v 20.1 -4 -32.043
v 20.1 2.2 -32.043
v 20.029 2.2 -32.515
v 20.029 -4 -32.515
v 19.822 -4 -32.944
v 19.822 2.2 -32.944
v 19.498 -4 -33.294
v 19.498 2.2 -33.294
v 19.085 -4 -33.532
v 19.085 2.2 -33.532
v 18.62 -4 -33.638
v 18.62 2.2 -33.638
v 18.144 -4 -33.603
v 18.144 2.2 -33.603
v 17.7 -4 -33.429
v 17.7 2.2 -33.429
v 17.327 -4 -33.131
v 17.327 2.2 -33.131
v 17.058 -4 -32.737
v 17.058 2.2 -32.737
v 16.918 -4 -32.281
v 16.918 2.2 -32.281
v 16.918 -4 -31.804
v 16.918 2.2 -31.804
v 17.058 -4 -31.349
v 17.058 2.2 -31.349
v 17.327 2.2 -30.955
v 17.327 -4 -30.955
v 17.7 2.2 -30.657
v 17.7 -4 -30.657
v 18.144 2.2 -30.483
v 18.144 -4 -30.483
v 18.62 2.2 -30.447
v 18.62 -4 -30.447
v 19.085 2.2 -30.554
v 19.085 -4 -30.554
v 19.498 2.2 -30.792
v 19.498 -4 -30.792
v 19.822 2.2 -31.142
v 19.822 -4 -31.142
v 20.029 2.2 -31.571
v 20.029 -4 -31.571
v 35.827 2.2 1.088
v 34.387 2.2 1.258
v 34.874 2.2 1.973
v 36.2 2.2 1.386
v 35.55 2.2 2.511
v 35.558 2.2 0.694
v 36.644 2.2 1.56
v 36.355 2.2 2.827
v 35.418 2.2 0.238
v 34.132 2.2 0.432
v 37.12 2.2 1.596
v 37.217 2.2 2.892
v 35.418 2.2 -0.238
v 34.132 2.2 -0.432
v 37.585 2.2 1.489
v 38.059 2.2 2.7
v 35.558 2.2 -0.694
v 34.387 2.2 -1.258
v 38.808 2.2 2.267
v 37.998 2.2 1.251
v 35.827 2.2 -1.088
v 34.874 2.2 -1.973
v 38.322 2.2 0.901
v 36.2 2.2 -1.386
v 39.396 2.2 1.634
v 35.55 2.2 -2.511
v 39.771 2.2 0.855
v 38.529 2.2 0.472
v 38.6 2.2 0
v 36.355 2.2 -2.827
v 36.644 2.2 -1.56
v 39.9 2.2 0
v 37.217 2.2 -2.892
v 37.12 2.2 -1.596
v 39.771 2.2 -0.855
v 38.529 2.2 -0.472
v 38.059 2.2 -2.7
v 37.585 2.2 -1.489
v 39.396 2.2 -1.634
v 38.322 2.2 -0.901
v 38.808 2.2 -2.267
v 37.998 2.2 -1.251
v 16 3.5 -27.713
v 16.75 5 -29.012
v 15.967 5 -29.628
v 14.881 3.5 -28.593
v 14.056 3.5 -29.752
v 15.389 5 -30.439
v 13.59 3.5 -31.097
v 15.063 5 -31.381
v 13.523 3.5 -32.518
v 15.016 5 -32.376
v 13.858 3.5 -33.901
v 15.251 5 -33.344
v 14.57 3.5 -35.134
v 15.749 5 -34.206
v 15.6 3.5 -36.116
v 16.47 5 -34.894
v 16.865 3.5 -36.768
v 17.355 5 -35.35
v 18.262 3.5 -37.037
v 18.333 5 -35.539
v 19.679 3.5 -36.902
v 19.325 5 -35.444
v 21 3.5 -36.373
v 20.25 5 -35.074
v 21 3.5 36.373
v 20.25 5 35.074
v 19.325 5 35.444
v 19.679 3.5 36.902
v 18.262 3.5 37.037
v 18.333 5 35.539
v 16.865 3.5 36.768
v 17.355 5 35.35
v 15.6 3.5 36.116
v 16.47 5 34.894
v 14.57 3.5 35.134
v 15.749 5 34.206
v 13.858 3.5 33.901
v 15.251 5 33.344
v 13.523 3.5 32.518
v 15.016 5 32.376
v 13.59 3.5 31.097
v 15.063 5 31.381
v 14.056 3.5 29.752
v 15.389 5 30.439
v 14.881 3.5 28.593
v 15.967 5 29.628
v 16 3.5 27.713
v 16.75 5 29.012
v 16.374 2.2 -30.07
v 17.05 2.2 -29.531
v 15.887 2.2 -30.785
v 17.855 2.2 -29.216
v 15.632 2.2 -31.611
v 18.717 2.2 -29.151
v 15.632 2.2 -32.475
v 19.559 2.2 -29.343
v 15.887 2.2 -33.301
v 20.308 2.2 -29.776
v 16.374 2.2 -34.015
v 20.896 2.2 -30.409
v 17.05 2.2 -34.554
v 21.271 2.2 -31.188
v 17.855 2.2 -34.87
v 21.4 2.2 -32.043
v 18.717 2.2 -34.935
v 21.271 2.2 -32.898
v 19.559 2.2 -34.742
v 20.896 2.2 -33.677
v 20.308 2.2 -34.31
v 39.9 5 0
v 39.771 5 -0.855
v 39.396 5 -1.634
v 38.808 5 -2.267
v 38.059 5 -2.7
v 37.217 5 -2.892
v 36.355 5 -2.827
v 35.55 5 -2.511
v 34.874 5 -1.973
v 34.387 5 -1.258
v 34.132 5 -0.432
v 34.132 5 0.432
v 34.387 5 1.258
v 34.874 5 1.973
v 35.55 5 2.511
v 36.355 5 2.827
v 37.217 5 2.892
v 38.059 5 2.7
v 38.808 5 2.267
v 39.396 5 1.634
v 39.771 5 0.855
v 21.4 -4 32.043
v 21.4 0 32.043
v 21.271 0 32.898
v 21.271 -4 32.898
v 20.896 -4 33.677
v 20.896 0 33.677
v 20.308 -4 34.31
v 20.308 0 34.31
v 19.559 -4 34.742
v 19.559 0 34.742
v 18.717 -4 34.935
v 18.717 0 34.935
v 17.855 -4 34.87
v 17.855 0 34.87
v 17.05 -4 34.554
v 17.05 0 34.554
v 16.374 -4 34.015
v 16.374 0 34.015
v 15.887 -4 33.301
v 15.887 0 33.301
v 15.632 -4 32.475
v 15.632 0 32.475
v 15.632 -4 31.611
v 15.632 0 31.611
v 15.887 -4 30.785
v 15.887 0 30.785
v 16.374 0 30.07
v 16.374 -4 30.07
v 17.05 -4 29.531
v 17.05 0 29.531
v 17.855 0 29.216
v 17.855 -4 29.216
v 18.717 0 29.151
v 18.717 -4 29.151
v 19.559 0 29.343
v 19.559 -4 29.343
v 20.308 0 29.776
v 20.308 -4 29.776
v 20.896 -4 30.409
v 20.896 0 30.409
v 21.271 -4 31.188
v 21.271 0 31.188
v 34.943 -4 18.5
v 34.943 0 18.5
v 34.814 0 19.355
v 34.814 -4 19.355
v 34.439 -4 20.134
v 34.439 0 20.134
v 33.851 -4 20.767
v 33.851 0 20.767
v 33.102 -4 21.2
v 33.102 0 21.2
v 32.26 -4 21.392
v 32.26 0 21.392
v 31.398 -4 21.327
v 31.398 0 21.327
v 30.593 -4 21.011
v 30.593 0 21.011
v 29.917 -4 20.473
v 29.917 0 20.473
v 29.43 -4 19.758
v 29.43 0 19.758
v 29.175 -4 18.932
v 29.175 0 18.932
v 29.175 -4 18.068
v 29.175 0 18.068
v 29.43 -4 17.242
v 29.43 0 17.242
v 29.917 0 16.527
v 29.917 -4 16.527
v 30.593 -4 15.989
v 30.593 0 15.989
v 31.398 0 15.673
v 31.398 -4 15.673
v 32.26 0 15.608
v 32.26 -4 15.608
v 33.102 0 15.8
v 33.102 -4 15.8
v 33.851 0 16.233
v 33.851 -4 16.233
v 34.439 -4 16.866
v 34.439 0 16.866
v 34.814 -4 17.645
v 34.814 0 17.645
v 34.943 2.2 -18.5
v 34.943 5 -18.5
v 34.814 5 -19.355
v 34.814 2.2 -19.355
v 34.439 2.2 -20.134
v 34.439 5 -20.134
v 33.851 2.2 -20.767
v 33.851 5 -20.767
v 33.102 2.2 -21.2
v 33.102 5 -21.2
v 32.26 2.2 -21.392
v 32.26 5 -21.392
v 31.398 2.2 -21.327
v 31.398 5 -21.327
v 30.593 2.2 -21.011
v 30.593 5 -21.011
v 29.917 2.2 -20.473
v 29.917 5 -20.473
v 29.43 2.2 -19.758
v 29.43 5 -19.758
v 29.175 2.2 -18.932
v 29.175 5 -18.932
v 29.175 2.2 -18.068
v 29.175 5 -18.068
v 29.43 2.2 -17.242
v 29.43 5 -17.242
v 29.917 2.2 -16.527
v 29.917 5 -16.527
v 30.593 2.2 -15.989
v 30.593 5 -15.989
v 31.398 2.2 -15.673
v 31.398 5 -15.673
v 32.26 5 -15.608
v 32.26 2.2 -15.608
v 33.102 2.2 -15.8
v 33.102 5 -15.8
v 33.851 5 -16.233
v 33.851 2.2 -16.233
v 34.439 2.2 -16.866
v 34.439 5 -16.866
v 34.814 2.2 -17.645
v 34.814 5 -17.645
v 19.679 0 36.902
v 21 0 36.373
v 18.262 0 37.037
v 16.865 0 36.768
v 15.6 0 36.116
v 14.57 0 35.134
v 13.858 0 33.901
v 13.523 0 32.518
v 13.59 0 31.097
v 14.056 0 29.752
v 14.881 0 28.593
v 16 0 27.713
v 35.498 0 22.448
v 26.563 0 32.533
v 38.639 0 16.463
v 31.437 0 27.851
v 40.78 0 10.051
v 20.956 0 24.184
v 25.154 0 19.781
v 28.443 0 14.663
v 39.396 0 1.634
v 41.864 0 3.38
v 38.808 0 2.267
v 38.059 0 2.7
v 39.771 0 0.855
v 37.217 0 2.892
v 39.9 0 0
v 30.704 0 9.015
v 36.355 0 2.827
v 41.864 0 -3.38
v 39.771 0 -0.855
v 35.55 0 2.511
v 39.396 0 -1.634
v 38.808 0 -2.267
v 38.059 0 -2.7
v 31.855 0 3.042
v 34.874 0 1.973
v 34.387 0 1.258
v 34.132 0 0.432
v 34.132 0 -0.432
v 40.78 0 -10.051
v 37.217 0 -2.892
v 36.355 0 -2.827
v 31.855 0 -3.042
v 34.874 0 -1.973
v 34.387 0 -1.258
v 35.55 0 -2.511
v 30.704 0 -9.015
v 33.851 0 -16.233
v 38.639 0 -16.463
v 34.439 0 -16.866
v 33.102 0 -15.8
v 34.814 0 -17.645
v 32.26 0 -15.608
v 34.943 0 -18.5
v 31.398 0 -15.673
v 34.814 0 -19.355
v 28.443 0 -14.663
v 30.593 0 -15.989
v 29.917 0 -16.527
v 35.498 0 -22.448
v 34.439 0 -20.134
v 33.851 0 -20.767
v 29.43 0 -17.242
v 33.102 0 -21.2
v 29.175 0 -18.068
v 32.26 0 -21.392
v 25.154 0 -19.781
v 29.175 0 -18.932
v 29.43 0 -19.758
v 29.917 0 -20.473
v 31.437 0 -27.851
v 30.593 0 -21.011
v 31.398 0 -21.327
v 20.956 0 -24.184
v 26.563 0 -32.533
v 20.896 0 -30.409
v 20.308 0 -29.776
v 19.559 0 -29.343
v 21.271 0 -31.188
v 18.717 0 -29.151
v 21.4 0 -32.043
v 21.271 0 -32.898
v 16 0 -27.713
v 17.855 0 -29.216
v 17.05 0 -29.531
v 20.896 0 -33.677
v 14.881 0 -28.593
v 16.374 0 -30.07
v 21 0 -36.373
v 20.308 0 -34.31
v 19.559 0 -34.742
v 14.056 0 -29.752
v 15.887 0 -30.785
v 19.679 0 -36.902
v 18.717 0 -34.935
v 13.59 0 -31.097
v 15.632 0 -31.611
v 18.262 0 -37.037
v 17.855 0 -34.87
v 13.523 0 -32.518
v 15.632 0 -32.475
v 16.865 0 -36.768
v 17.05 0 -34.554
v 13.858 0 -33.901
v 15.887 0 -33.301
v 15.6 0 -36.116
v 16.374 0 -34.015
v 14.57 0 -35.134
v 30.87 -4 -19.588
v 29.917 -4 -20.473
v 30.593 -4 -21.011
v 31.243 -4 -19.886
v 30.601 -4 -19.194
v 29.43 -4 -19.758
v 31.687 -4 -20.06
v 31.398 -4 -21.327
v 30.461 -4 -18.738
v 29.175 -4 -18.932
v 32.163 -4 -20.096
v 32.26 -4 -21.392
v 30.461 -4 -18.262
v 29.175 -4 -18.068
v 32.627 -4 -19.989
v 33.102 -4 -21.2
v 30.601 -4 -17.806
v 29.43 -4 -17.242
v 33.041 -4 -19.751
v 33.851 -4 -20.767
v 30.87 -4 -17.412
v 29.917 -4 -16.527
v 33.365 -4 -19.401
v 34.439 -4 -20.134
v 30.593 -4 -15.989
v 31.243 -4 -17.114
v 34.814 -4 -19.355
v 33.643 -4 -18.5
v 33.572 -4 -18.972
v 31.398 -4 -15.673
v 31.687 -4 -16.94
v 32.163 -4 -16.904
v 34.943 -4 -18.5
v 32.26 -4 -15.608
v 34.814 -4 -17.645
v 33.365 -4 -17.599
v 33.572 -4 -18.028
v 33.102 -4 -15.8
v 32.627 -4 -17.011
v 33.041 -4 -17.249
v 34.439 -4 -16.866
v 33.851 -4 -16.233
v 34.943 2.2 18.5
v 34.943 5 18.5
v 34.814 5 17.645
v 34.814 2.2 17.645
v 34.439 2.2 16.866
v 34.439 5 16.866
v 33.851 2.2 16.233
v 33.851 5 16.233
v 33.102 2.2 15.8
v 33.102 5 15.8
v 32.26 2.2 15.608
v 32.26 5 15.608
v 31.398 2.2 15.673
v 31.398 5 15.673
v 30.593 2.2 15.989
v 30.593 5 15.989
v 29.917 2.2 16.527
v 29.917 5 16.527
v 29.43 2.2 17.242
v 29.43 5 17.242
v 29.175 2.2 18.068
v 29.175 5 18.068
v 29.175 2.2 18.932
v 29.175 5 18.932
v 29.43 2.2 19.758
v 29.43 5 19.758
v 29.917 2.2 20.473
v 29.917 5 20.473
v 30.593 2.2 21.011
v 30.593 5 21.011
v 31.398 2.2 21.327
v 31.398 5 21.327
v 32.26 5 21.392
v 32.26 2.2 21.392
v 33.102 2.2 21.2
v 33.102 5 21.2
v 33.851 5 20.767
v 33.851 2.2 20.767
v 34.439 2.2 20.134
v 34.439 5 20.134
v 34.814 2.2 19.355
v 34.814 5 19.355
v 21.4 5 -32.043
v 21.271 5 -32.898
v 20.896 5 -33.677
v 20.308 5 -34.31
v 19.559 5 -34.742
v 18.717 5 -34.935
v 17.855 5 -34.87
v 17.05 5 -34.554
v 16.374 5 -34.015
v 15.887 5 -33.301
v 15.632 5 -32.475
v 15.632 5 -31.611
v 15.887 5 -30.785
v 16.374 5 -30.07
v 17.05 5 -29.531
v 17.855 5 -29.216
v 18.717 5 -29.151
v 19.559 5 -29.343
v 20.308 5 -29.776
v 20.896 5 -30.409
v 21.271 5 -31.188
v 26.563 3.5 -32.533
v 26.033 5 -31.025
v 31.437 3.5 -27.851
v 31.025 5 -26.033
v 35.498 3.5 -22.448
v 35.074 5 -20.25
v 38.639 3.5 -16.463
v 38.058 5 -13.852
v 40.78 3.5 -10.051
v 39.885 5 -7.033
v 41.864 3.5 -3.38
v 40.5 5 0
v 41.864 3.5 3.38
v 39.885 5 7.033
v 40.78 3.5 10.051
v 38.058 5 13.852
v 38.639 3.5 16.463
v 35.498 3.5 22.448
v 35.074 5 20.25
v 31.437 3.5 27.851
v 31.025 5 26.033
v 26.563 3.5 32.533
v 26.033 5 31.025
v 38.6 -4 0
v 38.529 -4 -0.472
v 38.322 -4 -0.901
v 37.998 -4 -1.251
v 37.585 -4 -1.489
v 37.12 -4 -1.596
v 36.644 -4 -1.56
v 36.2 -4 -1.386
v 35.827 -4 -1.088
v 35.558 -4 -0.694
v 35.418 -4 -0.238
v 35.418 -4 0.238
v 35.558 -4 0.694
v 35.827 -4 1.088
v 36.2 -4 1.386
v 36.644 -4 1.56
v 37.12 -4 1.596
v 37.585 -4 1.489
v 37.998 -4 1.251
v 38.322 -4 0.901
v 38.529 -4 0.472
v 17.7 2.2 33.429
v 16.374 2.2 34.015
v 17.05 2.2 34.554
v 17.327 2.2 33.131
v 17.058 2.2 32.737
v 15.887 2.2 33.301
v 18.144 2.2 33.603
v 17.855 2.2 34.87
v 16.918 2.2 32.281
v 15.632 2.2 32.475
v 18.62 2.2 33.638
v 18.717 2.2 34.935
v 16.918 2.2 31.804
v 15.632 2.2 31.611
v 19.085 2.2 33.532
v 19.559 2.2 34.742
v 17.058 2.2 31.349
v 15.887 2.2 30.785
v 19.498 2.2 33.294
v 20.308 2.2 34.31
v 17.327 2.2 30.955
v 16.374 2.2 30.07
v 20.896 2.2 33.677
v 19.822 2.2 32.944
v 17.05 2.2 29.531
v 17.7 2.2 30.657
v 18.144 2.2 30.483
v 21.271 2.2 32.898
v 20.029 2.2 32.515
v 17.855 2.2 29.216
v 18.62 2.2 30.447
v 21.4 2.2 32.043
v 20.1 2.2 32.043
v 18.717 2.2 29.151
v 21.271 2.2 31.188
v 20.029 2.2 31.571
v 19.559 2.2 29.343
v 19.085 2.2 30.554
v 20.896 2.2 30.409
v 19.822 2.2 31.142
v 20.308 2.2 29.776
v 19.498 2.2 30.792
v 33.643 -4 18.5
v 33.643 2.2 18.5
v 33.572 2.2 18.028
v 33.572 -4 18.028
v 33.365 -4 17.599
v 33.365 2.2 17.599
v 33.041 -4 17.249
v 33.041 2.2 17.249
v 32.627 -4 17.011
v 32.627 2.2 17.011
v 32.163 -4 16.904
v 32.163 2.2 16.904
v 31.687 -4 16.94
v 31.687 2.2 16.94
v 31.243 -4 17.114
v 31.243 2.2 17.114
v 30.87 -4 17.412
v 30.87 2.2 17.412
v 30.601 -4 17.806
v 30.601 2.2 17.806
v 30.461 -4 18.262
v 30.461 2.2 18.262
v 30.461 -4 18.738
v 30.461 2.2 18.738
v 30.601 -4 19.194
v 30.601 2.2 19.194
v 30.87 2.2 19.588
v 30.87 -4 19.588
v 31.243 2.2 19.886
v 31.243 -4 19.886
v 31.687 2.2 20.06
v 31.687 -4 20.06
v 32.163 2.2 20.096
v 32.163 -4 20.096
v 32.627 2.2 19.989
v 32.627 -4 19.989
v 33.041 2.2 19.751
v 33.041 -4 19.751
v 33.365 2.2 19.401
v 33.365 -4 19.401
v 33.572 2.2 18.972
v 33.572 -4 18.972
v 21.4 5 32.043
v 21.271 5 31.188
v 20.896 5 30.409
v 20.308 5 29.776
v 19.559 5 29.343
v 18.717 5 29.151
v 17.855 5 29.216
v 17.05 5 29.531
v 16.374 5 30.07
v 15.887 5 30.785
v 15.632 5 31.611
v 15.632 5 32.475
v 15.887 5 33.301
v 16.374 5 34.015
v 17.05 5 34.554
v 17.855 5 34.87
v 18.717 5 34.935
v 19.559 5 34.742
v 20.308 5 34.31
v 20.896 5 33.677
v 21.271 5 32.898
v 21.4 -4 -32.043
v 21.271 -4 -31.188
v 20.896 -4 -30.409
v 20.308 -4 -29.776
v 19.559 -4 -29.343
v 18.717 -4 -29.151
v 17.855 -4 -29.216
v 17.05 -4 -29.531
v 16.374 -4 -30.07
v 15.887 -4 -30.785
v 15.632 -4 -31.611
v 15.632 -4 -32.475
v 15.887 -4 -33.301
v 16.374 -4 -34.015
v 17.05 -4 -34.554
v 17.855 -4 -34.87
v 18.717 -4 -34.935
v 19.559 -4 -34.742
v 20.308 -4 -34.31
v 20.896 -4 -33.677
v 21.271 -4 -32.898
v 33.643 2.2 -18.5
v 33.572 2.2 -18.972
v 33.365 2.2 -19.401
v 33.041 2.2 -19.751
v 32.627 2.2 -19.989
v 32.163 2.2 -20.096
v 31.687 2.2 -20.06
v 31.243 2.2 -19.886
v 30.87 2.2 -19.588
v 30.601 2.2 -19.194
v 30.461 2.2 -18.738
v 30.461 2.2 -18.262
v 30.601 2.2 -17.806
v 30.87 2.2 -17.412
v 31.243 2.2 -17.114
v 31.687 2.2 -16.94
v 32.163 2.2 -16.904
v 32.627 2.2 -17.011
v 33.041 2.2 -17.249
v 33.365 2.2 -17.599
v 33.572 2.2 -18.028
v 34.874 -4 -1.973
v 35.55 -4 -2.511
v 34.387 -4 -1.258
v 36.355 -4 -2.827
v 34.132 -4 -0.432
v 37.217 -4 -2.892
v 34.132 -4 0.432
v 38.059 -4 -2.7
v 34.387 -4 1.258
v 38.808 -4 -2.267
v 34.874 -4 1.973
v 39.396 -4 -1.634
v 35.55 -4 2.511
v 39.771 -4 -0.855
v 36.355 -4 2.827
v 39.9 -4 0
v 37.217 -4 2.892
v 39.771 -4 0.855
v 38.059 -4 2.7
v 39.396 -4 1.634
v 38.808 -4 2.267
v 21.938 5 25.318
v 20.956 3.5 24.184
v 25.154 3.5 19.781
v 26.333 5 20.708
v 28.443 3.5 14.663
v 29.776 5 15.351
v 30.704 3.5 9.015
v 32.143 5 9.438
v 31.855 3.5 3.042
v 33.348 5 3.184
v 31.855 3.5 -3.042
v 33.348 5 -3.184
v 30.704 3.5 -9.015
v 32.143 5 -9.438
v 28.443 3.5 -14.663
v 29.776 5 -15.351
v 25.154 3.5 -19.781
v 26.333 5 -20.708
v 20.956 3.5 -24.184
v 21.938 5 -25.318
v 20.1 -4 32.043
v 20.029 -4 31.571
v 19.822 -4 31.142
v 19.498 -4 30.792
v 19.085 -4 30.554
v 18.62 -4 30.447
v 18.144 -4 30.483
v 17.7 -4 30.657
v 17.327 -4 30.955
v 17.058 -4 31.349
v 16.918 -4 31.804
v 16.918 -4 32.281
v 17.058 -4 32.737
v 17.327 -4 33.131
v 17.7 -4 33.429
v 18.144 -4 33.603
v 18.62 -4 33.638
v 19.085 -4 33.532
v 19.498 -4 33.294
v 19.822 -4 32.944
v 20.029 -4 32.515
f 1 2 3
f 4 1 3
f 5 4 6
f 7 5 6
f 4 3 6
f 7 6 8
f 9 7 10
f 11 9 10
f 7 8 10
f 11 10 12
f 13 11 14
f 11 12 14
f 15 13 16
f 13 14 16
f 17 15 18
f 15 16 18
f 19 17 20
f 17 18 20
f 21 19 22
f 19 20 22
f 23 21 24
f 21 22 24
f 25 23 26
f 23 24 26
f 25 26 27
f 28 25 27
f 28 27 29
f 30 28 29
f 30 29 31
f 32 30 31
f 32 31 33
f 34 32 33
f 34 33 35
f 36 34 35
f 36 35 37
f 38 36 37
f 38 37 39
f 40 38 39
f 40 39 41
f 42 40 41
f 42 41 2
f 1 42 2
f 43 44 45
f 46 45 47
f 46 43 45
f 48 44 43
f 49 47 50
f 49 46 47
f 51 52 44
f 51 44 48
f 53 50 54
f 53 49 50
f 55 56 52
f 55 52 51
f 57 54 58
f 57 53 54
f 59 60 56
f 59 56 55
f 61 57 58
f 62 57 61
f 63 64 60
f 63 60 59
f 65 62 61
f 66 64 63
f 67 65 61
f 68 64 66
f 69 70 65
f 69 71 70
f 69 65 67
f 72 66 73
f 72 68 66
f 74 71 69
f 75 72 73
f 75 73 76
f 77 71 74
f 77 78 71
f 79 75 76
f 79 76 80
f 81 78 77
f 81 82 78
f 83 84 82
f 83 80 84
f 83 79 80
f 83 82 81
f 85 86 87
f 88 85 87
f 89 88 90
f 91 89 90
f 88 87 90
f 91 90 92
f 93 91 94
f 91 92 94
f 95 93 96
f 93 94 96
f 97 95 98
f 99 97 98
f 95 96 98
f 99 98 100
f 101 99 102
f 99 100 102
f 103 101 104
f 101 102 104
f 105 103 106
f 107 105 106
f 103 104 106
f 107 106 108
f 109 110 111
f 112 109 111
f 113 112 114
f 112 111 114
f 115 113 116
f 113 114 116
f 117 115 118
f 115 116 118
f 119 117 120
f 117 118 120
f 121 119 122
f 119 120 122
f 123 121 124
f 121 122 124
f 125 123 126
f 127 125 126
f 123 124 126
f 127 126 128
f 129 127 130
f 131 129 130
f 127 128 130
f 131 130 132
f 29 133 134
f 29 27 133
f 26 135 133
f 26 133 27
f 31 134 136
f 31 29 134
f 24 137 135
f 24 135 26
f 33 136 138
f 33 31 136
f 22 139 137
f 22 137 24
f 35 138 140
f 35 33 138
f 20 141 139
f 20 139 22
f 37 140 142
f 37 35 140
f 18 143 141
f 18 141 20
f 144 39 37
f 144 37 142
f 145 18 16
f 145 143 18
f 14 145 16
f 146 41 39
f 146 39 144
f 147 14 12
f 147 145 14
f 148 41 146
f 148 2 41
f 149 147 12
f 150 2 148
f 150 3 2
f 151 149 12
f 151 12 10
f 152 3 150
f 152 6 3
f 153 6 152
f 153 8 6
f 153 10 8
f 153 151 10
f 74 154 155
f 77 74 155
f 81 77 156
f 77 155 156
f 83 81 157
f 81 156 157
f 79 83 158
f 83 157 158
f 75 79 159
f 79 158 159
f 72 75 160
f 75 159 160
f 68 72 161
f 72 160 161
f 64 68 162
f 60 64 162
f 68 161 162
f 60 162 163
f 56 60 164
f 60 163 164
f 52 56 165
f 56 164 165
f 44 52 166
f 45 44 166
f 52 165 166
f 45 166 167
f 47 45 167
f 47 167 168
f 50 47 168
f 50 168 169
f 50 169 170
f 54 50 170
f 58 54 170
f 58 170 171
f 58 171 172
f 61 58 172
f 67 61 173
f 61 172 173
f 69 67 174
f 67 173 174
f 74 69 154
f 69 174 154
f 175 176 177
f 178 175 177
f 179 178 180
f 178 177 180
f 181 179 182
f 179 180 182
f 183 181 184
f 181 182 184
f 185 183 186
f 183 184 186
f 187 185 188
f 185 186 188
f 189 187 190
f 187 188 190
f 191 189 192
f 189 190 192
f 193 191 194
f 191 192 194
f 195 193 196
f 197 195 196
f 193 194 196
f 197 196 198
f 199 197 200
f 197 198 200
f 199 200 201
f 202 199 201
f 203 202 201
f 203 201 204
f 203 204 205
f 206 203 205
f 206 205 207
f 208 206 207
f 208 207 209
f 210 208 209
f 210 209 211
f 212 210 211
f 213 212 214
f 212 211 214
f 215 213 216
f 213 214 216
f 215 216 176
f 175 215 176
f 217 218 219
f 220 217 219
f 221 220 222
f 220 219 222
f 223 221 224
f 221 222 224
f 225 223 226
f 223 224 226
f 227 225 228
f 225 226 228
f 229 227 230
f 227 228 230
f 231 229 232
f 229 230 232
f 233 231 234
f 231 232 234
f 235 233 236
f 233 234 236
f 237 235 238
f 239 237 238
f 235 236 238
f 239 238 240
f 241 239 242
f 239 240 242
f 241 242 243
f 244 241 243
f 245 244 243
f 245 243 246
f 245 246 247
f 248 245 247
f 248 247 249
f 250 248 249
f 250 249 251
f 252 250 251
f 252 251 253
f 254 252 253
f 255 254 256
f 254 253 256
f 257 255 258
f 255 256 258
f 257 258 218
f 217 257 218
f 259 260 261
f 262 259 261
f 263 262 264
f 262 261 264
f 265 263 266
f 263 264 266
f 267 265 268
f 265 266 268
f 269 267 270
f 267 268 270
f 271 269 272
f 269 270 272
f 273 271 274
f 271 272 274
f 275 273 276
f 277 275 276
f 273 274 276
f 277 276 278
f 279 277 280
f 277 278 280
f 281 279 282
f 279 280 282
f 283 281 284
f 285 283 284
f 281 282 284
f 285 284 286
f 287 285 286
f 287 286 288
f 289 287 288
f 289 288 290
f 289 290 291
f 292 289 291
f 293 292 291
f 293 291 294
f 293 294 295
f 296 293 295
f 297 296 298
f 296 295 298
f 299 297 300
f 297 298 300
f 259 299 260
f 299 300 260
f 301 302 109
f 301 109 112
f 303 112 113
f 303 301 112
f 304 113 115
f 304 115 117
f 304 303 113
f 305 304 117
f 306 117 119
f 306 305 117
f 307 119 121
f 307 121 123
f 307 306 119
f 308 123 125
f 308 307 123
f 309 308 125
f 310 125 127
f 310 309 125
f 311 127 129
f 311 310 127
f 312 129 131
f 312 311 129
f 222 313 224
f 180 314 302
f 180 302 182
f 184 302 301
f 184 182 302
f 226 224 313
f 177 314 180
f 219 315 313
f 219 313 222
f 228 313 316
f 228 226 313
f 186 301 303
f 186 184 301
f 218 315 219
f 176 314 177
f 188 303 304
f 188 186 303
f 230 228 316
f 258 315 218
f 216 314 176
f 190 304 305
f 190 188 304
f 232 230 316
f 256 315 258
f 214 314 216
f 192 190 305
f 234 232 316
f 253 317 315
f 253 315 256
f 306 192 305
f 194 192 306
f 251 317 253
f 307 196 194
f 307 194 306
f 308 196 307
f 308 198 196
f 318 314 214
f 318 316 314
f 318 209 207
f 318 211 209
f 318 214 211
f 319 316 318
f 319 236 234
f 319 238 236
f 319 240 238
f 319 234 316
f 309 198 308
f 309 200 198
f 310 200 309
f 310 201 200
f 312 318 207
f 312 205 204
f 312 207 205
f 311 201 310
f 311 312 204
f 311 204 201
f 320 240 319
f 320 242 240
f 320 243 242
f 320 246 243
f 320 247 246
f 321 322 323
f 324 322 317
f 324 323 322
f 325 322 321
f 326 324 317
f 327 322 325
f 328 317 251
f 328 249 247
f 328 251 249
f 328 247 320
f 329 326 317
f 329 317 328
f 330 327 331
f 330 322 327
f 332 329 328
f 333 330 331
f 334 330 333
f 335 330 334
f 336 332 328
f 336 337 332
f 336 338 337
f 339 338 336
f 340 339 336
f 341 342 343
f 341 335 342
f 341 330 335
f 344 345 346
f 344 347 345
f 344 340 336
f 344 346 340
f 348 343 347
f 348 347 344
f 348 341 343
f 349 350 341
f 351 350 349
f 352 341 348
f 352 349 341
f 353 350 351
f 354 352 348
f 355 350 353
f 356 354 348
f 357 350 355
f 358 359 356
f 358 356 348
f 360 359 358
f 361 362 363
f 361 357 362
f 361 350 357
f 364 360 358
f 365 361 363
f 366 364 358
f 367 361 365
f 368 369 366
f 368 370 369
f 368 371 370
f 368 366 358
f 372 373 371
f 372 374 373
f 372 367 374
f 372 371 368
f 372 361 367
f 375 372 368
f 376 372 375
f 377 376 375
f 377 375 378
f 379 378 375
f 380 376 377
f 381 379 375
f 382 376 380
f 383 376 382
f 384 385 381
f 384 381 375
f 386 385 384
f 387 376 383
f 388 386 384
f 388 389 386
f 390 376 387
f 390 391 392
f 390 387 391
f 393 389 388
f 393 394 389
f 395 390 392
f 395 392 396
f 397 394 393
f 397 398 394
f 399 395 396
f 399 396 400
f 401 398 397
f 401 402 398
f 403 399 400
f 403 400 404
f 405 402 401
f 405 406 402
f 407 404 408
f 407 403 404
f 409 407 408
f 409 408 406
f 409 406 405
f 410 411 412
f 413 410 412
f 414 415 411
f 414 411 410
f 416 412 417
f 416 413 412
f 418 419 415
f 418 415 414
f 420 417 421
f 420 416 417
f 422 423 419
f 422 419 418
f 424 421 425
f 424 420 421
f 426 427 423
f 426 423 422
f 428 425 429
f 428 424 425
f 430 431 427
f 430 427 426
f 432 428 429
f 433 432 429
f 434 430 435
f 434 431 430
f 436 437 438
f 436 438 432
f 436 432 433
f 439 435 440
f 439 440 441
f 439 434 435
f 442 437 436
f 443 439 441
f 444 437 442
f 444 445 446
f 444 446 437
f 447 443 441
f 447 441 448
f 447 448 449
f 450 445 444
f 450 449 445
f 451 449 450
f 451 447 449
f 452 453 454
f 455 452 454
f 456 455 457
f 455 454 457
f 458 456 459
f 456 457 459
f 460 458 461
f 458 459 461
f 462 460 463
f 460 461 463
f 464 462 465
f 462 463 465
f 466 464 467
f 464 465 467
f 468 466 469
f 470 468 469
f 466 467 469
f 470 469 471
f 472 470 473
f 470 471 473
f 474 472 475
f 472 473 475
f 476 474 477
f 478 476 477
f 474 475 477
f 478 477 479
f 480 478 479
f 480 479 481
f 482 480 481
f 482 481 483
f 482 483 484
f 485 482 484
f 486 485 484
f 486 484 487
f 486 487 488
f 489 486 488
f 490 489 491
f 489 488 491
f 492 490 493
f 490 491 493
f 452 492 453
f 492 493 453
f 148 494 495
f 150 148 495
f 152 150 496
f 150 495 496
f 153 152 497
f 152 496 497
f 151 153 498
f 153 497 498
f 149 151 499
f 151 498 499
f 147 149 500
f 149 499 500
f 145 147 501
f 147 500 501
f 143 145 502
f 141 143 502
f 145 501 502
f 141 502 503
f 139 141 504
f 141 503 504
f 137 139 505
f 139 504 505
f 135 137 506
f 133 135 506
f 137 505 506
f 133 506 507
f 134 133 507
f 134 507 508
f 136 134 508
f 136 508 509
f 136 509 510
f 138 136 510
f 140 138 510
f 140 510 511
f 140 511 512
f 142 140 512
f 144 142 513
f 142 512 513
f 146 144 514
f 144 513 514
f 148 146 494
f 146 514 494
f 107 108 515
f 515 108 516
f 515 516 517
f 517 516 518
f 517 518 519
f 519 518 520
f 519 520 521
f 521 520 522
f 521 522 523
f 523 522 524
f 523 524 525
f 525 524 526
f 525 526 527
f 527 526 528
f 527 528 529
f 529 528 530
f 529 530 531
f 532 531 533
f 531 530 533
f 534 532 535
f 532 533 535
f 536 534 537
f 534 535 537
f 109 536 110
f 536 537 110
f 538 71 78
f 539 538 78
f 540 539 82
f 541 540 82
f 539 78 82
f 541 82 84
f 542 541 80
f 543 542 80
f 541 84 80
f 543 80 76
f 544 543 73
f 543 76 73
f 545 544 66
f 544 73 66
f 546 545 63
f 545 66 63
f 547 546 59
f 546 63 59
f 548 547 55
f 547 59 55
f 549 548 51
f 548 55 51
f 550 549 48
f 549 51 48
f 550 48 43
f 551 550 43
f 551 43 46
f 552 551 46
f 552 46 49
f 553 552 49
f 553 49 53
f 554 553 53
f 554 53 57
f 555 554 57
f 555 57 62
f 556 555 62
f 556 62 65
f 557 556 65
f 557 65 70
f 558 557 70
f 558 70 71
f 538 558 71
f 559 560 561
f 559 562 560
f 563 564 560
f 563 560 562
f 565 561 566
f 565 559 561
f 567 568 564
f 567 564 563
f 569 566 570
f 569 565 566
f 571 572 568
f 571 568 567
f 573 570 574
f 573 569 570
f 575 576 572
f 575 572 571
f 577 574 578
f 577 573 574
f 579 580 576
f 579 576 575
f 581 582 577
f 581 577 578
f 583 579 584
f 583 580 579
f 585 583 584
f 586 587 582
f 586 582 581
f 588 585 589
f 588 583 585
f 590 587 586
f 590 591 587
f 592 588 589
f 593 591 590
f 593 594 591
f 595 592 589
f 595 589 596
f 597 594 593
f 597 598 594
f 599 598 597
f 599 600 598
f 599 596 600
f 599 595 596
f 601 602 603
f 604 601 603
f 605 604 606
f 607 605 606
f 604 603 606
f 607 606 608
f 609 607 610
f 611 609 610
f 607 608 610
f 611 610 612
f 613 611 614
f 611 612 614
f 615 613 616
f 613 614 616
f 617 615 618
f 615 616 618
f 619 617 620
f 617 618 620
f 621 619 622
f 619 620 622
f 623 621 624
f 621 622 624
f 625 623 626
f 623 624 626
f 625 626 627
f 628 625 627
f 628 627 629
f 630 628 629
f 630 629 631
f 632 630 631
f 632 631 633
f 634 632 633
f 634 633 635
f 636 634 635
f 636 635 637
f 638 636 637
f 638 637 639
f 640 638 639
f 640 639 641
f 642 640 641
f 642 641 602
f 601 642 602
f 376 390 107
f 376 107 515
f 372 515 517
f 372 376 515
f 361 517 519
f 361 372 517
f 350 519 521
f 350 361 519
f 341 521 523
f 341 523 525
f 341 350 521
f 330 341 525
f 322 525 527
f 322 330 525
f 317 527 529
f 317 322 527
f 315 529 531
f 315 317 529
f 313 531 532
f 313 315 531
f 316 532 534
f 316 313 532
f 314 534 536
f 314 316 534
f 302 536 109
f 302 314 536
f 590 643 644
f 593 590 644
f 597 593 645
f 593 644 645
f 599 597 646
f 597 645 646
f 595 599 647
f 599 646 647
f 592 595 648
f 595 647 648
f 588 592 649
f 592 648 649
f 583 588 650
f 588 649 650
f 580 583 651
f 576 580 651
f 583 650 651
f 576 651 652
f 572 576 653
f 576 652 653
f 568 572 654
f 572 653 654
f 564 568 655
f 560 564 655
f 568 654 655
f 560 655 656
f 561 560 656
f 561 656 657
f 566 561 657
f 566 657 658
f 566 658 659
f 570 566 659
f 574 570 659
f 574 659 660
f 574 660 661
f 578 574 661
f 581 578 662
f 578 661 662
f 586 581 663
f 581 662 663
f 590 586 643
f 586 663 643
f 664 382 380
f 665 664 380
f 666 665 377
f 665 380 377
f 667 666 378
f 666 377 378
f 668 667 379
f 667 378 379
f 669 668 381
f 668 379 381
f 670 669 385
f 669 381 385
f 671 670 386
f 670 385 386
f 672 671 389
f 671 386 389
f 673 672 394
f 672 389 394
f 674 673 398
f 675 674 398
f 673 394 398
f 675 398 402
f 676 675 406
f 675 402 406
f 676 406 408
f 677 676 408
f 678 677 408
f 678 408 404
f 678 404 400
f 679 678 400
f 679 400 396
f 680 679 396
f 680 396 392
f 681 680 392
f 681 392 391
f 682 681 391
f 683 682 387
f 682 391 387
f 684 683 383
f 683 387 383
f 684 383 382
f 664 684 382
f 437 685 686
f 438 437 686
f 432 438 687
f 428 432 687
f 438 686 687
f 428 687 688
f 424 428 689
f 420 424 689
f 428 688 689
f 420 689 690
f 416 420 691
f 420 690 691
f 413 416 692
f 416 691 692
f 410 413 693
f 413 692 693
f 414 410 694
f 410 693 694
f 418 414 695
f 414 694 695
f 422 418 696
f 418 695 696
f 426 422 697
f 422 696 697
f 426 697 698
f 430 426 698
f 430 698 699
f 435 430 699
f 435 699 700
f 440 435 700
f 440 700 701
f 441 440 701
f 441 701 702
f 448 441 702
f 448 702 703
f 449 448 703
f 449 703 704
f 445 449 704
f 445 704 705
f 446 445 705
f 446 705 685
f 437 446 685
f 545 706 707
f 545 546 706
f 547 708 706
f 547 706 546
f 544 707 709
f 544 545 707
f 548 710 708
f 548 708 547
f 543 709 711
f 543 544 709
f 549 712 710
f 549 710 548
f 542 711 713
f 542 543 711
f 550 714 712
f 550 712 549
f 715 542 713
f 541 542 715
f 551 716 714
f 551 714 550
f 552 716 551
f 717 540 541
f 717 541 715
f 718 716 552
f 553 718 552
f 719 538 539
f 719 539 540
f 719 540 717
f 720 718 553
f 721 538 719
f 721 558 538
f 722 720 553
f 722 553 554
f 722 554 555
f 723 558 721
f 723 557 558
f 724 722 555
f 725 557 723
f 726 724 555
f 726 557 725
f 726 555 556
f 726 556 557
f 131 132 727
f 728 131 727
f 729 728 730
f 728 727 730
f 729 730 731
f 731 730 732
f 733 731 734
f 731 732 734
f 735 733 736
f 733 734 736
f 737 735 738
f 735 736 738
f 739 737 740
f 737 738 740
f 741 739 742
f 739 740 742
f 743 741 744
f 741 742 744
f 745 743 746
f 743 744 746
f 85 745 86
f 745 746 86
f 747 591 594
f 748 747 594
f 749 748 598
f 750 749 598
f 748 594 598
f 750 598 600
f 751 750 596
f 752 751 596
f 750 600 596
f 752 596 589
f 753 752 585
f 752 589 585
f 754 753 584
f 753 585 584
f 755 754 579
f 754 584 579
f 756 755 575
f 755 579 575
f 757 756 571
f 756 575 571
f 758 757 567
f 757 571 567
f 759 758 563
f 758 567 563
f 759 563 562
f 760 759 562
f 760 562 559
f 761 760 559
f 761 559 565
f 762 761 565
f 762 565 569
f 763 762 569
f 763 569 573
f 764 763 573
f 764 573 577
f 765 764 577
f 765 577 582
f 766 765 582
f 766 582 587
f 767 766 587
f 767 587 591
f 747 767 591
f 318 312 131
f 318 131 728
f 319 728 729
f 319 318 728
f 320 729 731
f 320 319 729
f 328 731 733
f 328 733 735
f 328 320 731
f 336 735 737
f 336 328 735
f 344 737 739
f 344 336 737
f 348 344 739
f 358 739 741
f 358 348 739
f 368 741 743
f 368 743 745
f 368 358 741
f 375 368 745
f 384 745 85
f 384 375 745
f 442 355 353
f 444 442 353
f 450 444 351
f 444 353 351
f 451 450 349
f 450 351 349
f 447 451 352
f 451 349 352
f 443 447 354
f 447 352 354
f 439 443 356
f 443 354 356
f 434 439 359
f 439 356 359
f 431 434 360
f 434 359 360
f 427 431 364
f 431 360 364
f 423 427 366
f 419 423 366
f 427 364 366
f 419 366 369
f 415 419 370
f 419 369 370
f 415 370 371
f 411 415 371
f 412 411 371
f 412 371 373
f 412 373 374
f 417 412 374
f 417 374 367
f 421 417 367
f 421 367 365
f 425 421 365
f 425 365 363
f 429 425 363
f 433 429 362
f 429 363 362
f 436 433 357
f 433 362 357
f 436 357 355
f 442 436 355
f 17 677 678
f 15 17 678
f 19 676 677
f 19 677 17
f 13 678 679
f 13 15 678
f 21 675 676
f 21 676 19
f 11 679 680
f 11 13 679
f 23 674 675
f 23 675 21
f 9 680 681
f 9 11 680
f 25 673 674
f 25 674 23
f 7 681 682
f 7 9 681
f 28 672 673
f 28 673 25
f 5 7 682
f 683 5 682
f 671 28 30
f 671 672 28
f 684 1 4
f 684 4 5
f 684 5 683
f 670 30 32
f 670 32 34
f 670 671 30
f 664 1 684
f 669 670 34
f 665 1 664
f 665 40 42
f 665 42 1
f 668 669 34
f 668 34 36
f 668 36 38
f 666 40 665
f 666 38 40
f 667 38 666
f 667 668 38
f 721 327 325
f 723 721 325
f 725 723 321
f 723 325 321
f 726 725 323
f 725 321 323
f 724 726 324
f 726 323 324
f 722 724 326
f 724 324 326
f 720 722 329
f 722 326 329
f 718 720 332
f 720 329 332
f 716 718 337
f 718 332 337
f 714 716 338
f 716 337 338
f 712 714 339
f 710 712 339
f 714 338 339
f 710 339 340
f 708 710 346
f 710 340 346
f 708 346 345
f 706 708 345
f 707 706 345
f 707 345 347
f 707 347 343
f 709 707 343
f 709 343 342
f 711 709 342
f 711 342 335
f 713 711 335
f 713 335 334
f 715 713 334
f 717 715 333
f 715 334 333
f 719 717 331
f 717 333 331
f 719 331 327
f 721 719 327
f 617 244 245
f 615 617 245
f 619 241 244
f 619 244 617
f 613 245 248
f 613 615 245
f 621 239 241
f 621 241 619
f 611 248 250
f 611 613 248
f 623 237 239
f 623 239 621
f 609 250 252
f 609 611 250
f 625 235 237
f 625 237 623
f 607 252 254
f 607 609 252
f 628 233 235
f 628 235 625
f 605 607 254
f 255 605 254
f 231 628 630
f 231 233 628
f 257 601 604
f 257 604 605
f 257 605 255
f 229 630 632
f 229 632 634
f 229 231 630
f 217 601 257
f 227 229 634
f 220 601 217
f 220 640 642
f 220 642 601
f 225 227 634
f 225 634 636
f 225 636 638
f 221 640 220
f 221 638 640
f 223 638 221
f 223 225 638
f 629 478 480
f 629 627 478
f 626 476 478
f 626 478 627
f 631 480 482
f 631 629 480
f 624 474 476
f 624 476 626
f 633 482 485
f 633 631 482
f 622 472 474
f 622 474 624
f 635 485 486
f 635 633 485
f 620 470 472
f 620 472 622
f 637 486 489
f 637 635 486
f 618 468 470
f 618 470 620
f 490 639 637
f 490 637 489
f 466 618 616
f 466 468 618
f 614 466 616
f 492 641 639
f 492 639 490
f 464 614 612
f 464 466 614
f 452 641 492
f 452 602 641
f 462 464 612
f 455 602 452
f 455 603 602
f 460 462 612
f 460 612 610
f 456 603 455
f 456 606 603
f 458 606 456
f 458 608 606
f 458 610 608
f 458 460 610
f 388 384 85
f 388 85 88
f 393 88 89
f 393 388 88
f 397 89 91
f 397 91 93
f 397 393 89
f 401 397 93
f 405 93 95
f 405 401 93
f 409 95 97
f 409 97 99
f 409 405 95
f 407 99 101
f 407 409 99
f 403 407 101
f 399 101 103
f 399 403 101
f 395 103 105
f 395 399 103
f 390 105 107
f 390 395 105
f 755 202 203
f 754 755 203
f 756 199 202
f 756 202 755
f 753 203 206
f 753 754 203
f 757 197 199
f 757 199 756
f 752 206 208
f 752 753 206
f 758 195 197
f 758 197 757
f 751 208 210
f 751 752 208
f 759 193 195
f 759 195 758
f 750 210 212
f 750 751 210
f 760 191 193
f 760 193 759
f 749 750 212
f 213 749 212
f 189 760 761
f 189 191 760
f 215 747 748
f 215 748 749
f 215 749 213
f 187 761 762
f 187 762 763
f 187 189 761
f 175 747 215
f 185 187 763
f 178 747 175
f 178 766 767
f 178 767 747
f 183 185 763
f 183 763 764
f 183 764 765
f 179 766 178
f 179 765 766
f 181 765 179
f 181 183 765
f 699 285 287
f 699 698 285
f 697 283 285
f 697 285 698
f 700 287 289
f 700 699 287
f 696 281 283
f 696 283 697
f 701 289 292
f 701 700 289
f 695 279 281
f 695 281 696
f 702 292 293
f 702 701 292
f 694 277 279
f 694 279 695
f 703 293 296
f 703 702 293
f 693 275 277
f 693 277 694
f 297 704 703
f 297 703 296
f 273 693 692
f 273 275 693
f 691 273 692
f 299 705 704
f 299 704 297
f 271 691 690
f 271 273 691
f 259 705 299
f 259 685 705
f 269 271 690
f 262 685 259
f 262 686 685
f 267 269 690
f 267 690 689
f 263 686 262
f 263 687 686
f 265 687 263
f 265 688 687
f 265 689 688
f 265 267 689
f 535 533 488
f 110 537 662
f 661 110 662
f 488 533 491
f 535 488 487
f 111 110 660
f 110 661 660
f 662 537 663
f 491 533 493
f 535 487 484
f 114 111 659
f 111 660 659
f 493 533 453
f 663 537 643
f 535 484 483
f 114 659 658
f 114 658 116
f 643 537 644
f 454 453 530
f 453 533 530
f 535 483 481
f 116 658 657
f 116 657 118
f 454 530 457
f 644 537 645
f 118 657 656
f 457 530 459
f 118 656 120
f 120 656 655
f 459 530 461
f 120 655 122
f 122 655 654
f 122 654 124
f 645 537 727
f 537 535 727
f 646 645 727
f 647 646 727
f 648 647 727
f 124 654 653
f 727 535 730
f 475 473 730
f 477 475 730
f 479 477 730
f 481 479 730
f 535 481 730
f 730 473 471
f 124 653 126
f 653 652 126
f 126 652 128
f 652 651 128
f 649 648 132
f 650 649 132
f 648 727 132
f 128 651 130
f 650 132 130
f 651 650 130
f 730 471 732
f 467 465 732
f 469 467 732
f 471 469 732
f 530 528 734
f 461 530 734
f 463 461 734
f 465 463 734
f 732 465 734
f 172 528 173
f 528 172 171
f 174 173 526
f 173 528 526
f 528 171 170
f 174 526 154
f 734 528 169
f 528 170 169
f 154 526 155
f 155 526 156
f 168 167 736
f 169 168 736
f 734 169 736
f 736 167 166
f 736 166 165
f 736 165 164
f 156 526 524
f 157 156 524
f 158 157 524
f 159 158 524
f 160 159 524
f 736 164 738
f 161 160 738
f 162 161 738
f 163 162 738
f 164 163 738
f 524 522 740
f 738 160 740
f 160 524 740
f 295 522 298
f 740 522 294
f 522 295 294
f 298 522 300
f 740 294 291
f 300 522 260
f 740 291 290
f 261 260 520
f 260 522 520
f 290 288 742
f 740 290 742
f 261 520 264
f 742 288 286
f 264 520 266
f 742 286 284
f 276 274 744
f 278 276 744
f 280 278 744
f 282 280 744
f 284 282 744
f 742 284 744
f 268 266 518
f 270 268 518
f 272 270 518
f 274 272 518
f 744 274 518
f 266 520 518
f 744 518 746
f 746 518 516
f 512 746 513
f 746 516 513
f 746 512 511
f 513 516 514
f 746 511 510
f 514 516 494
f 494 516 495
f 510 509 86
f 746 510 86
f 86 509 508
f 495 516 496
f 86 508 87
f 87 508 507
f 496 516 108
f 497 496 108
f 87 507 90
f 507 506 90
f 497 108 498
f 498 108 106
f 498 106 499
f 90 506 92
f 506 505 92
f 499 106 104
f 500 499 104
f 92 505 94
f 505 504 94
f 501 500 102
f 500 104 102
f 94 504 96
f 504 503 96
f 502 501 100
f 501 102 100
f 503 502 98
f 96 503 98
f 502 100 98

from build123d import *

# Parameters (mm, degrees)
EXTRUDE_1_DEPTH     = 5
SKETCH_3_R          = 2.9
EXTRUDE_3_DEPTH     = 4
SKETCH_4_R          = 1.6
CUT_EXTRUDE_1_DEPTH = 10
SKETCH_5_R          = 2.9
CUT_EXTRUDE_2_DEPTH = 2.8
CHAMFER_1_SIZE      = 1.5


with BuildPart() as part:
    # 草图1 → 凸台-拉伸1 (new body)
    with BuildSketch(Plane(origin=(0, 0, 0), x_dir=(1, 0, 0), z_dir=(0, 1, 0))):
        with BuildLine():
            ThreePointArc((21, -36.373066959), (14.169872981, -34.54293994), (16, -27.712812921))
            ThreePointArc((16, -27.712812921), (32, 0), (16, 27.712812921))
            ThreePointArc((16, 27.712812921), (14.169872981, 34.54293994), (21, 36.373066959))
            ThreePointArc((21, 36.373066959), (42, 0), (21, -36.373066959))
        make_face()
    extrude(amount=EXTRUDE_1_DEPTH)

    # 草图3 → 凸台-拉伸3 (add)
    with BuildSketch(Plane.XZ):
        with Locations((18.5, 32.04293994)):
            Circle(SKETCH_3_R)
        with Locations((32.04293994, 18.5)):
            Circle(SKETCH_3_R)
        with Locations((37, 0)):
            Circle(SKETCH_3_R)
        with Locations((32.04293994, -18.5)):
            Circle(SKETCH_3_R)
        with Locations((18.5, -32.04293994)):
            Circle(SKETCH_3_R)
    extrude(amount=EXTRUDE_3_DEPTH)

    # 草图4 → 切除-拉伸1 (cut, through all)
    with BuildSketch(Plane(origin=(0, 5, 0), x_dir=(1, 0, 0), z_dir=(0, 1, 0))):
        with Locations((18.5, 32.04293994)):
            Circle(SKETCH_4_R)
        with Locations((32.04293994, 18.5)):
            Circle(SKETCH_4_R)
        with Locations((37, 0)):
            Circle(SKETCH_4_R)
        with Locations((32.04293994, -18.5)):
            Circle(SKETCH_4_R)
        with Locations((18.5, -32.04293994)):
            Circle(SKETCH_4_R)
    extrude(amount=-CUT_EXTRUDE_1_DEPTH, mode=Mode.SUBTRACT)

    # 草图5 → 切除-拉伸2 (cut)
    with BuildSketch(Plane(origin=(0, 5, 0), x_dir=(1, 0, 0), z_dir=(0, 1, 0))):
        with Locations((18.5, 32.04293994)):
            Circle(SKETCH_5_R)
        with Locations((32.04293994, 18.5)):
            Circle(SKETCH_5_R)
        with Locations((37, 0)):
            Circle(SKETCH_5_R)
        with Locations((32.04293994, -18.5)):
            Circle(SKETCH_5_R)
        with Locations((18.5, -32.04293994)):
            Circle(SKETCH_5_R)
    extrude(amount=-CUT_EXTRUDE_2_DEPTH, mode=Mode.SUBTRACT)

    # 倒角1
    chamfer_1_edges = [part.edges().sort_by_distance(p)[0] for p in [
        (42, 5, 0),
        (14.169872981, 5, -34.54293994),
        (32, 5, 0),
        (14.169872981, 5, 34.54293994),
    ]]
    chamfer(chamfer_1_edges, length=CHAMFER_1_SIZE)


solid = part.part
